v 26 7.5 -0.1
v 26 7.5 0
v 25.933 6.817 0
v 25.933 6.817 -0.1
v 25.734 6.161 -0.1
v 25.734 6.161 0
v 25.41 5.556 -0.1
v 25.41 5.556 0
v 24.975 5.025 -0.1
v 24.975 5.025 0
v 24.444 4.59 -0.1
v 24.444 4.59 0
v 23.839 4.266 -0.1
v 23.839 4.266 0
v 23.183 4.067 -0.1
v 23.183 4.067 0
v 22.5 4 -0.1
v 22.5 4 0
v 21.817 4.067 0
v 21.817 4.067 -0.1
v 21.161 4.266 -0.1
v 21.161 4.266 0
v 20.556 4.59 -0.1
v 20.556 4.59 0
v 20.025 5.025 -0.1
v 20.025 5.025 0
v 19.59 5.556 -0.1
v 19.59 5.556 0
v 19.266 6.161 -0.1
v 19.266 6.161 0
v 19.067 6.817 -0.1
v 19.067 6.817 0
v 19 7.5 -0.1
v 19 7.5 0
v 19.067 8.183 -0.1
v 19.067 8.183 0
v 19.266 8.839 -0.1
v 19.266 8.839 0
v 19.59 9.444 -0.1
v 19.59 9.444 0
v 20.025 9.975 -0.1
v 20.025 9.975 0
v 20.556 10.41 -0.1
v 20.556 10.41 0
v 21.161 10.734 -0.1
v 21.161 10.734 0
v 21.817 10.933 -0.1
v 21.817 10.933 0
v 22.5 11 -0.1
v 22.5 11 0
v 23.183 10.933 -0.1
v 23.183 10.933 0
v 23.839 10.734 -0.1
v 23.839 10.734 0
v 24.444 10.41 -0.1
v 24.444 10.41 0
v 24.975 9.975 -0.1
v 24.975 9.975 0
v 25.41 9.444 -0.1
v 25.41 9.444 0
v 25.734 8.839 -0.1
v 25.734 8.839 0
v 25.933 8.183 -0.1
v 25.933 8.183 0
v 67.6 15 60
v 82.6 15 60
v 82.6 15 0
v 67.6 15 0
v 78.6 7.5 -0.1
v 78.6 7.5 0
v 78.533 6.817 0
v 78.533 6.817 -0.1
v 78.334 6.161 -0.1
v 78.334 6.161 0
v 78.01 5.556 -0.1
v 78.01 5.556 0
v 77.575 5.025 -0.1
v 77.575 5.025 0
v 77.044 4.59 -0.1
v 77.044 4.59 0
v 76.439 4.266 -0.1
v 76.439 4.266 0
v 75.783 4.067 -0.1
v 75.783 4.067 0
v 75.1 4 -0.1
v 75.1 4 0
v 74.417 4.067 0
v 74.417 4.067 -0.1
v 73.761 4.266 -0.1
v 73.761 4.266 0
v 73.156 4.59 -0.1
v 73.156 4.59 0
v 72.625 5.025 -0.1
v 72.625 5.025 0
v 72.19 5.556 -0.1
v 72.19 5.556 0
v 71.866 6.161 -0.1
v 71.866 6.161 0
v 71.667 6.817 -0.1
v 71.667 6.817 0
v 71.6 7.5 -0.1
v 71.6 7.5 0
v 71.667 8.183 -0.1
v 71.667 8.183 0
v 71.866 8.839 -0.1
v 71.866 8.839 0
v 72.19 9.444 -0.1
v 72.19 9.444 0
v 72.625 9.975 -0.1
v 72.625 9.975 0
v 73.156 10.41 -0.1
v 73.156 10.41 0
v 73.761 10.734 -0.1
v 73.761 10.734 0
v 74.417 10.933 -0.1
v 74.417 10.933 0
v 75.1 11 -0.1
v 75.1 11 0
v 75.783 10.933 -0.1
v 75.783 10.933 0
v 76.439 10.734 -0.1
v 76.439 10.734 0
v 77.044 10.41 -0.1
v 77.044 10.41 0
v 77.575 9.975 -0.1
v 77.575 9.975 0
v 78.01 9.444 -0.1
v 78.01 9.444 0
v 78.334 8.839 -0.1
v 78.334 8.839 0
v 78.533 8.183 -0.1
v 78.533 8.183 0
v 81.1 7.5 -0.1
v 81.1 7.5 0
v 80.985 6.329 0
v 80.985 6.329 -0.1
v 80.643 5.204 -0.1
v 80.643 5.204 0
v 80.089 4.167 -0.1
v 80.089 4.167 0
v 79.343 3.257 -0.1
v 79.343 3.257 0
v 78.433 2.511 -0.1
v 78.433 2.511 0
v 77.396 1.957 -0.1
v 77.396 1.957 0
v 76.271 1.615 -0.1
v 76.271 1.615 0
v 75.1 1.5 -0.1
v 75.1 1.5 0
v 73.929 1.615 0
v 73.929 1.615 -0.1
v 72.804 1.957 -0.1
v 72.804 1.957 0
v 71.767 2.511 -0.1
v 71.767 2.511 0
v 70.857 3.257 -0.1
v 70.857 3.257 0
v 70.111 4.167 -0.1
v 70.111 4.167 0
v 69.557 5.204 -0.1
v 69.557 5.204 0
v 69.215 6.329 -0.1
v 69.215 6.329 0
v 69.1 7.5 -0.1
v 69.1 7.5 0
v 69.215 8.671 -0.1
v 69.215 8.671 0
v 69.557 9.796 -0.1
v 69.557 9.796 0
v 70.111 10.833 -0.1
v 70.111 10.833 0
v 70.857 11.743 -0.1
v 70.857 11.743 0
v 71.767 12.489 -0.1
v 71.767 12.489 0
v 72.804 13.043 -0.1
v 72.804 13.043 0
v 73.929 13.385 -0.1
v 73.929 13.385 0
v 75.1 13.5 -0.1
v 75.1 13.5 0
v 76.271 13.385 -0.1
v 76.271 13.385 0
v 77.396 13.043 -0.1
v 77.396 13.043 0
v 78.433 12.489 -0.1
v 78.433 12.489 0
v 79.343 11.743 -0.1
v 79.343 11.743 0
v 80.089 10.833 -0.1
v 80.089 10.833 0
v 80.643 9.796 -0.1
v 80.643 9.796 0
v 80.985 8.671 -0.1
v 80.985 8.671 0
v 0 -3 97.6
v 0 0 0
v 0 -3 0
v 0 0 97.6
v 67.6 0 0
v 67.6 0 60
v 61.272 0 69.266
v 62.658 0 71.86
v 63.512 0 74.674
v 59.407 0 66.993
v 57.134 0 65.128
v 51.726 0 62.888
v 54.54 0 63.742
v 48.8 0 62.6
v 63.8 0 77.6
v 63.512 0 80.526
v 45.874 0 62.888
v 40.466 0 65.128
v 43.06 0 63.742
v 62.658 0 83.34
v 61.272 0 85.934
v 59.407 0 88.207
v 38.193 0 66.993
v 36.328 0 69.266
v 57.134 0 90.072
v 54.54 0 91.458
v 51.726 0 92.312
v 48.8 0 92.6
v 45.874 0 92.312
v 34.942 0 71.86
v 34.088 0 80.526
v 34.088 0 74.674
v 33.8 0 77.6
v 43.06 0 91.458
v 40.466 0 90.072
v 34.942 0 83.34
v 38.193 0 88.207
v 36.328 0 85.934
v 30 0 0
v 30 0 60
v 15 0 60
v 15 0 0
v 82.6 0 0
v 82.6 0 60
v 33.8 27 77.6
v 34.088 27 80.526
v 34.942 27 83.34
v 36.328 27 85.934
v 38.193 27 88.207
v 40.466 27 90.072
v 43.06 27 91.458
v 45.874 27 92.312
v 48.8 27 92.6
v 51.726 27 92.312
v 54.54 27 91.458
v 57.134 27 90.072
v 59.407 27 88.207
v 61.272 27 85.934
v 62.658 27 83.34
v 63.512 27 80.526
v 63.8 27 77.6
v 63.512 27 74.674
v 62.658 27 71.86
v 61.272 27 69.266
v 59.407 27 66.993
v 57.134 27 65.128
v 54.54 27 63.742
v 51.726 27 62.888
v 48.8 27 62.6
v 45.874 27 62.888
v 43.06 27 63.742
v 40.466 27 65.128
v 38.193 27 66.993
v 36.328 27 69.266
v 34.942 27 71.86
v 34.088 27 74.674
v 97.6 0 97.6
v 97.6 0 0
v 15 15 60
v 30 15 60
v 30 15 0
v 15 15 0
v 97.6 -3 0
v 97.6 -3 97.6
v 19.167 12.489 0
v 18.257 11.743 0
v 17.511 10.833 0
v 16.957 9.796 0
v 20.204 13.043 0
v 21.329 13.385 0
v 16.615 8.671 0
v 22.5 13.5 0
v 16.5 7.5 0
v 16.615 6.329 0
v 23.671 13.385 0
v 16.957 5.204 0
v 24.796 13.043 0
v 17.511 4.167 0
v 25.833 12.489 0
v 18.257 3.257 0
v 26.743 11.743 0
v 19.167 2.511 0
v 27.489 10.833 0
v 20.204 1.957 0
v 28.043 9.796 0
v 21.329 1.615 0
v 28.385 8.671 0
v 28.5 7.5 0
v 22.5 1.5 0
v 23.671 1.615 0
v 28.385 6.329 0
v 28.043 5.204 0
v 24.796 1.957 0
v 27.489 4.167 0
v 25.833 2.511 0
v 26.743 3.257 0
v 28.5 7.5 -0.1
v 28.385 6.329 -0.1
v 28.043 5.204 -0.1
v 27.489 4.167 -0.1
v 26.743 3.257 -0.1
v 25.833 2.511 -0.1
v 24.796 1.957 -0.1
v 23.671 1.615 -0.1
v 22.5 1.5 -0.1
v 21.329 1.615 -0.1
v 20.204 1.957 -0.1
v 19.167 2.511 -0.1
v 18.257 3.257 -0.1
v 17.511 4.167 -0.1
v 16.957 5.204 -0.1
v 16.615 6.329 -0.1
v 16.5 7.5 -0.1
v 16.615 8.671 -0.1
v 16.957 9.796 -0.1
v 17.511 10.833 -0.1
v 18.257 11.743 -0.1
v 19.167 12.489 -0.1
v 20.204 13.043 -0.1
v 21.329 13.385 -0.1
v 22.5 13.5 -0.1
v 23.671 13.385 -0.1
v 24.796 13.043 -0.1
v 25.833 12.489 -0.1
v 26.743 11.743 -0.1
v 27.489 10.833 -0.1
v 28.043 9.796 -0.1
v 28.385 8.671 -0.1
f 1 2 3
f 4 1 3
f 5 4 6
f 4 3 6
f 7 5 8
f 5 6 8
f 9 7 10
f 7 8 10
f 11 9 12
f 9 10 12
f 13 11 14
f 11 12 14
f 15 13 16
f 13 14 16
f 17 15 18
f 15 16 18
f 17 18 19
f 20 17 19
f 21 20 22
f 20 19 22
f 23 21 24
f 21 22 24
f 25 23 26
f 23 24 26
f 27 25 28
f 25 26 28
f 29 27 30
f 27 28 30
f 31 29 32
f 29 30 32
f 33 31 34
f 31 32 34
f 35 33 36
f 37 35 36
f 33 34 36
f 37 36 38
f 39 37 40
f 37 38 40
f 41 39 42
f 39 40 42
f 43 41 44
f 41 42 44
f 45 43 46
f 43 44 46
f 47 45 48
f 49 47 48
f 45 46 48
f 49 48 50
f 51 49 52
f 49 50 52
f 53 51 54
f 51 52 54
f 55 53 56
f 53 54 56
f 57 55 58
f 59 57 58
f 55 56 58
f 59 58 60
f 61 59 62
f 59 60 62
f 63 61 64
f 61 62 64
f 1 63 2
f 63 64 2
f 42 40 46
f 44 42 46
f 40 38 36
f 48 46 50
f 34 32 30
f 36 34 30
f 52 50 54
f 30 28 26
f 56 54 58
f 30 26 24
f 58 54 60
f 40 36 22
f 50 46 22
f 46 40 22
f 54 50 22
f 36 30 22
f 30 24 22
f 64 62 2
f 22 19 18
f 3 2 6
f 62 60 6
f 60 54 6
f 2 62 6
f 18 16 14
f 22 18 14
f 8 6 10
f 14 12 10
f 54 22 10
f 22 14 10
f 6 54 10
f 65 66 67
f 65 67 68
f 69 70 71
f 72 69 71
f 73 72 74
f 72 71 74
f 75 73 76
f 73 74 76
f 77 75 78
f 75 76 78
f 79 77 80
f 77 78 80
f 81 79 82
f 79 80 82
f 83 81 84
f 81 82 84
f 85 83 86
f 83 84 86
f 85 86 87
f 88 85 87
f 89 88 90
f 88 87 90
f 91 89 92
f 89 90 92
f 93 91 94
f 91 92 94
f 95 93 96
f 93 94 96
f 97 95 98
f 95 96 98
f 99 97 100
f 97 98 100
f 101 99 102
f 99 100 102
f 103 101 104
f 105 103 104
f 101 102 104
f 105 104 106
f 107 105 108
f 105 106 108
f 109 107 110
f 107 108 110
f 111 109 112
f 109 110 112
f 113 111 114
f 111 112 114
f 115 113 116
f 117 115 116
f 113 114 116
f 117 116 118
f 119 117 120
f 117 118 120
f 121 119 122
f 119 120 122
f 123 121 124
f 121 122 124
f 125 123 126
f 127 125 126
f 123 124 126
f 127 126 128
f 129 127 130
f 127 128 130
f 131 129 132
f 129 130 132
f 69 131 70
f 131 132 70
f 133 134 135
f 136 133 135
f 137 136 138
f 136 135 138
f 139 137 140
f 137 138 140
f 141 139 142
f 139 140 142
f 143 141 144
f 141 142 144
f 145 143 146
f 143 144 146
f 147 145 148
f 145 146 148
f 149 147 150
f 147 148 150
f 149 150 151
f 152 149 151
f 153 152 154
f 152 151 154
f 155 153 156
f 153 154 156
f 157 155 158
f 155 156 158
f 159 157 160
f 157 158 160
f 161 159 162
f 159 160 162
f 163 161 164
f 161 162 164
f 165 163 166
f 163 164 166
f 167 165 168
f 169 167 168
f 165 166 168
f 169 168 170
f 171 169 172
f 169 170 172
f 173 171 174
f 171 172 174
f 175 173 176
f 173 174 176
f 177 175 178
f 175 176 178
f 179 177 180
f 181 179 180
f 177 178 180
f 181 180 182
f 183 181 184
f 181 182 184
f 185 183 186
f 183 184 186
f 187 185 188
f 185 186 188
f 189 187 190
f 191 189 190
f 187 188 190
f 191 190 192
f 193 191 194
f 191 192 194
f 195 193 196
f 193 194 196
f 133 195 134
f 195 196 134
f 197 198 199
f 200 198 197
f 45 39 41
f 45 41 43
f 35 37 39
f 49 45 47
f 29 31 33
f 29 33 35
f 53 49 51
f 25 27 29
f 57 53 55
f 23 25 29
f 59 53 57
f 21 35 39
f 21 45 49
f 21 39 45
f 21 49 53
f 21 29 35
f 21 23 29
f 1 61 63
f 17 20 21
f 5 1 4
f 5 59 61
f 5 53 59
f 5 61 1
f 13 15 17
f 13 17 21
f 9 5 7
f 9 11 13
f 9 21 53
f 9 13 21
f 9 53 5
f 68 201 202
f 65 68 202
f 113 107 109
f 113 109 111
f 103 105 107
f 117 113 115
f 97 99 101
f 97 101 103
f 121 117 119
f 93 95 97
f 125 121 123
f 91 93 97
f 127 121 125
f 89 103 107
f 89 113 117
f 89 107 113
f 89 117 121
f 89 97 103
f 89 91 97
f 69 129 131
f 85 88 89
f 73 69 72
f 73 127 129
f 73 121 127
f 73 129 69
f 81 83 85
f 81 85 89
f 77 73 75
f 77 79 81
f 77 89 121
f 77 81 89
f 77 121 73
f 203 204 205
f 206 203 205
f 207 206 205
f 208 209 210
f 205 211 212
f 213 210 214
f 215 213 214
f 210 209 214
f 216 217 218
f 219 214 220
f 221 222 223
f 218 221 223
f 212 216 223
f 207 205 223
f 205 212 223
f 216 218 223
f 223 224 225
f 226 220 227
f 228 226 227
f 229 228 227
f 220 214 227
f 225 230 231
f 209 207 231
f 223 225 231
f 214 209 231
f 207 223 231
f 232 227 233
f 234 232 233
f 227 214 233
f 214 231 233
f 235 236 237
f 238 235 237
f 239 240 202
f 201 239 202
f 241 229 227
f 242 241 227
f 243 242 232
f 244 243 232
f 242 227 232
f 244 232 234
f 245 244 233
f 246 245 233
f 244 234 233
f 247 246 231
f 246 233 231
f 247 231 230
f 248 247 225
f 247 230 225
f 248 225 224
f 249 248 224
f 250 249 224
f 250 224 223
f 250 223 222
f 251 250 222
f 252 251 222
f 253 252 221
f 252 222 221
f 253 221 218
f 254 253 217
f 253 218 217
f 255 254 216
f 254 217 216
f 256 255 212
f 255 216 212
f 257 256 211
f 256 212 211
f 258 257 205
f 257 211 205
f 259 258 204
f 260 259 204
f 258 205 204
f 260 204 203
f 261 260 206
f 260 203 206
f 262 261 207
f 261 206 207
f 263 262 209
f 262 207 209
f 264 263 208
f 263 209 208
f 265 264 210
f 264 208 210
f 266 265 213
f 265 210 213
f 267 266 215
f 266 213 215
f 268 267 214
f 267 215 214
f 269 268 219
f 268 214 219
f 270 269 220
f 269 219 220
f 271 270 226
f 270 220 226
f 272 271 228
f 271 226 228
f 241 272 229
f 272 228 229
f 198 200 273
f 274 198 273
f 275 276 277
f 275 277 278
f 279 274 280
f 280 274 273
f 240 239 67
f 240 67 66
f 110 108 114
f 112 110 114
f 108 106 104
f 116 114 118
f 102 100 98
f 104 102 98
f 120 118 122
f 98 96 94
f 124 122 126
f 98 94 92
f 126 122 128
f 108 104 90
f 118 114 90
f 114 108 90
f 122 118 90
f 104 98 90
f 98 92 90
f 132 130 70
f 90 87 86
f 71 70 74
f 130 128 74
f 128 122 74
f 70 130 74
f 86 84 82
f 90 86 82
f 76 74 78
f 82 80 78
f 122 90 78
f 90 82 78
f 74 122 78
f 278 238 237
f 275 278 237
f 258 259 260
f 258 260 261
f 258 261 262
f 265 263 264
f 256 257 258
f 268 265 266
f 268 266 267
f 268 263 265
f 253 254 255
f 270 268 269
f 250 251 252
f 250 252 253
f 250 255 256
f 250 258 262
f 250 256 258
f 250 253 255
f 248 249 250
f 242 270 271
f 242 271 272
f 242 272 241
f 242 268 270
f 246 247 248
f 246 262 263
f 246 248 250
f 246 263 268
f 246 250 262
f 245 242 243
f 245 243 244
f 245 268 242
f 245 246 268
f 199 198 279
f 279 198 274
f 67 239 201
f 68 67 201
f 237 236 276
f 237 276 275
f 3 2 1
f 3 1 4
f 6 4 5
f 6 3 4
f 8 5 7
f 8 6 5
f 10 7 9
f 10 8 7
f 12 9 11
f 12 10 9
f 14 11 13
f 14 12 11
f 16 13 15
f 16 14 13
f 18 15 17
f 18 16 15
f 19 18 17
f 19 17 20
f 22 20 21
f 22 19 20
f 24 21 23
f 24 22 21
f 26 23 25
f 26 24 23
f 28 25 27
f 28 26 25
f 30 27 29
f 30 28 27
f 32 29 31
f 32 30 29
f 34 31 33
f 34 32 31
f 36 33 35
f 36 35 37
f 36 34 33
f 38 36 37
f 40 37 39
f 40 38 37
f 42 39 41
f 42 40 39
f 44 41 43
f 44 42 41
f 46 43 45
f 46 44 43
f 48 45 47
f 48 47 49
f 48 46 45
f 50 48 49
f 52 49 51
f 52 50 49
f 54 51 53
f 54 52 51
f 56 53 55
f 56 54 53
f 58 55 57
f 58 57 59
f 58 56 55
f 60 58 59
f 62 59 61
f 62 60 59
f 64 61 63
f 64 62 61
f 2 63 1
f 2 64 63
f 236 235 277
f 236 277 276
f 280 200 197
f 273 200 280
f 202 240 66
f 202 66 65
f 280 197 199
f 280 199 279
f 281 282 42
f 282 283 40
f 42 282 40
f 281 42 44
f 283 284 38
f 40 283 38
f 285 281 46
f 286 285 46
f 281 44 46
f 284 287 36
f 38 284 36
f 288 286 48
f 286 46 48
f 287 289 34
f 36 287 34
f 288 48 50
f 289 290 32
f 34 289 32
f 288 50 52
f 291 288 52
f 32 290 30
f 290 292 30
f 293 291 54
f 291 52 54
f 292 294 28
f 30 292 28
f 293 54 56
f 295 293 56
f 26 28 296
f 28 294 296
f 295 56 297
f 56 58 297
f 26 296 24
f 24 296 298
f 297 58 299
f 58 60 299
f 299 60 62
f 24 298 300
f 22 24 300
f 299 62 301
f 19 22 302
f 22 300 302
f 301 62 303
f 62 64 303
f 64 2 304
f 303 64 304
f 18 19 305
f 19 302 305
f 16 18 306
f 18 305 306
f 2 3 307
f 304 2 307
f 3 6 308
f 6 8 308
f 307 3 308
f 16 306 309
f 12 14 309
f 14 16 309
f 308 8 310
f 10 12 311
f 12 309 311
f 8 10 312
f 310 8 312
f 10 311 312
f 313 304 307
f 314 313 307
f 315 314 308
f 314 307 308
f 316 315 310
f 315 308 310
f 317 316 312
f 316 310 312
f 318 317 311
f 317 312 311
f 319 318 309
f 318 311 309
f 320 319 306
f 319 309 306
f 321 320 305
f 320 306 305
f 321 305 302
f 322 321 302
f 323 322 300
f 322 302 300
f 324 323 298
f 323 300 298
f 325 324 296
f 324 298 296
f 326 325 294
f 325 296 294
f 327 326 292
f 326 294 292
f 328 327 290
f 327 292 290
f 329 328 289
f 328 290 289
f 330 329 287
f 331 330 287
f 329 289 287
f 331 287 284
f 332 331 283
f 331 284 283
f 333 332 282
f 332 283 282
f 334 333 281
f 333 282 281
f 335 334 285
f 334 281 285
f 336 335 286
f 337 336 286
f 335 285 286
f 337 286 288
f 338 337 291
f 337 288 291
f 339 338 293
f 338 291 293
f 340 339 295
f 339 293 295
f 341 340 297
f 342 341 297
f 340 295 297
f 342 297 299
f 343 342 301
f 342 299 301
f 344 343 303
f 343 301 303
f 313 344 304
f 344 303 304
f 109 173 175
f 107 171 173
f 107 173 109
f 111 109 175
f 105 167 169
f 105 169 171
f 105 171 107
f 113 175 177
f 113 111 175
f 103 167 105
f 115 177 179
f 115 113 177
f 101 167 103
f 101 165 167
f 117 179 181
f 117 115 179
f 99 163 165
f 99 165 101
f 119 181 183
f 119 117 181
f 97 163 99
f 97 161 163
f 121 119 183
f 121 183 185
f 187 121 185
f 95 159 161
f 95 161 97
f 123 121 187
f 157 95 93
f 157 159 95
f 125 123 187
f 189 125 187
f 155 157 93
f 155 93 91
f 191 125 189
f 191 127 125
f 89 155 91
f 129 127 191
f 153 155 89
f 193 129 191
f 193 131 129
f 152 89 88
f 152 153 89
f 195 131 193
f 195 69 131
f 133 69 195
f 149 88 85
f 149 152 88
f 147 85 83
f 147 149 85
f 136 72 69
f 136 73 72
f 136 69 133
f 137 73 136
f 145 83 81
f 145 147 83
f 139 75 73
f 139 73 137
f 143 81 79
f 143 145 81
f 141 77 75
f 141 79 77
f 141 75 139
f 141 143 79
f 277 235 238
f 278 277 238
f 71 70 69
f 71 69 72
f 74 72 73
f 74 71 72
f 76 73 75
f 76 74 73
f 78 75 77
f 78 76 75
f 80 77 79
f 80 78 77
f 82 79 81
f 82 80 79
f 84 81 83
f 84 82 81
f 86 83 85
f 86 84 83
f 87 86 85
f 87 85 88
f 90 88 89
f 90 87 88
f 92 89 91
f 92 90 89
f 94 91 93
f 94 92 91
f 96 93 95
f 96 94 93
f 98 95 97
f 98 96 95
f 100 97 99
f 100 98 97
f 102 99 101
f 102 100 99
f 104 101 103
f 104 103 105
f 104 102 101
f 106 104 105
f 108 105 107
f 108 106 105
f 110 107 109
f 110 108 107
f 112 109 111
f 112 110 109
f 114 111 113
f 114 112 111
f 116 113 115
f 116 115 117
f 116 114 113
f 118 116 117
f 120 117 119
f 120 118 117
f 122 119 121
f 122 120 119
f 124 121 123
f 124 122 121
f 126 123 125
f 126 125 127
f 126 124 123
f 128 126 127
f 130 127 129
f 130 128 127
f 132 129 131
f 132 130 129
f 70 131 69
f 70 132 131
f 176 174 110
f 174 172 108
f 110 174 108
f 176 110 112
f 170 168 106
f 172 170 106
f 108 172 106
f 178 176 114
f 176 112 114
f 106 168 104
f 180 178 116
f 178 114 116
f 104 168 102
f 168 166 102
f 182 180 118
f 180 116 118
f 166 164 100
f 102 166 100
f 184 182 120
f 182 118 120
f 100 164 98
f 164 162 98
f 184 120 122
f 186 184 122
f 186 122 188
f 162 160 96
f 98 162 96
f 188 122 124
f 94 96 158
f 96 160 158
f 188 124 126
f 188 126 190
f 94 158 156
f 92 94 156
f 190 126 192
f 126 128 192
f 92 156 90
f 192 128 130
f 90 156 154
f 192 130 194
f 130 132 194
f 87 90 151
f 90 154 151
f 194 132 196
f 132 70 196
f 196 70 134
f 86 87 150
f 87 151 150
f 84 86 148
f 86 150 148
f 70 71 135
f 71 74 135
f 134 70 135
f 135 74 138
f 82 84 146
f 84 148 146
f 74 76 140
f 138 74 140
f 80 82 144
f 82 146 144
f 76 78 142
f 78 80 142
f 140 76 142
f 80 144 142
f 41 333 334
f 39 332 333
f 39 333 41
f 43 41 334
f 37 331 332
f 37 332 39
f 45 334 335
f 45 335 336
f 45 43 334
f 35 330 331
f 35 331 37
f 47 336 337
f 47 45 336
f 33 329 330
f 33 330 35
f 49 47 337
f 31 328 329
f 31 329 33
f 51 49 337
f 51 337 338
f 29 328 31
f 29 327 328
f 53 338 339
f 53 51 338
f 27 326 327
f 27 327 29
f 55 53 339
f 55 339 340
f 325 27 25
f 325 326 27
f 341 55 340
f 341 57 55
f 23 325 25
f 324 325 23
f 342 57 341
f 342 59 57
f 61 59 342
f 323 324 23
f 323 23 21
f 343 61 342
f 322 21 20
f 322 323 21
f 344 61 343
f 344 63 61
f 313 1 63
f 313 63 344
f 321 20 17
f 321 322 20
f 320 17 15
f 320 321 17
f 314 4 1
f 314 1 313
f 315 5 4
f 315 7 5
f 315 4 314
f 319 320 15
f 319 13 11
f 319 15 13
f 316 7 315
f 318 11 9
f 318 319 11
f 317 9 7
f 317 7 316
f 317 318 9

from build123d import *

# Parameters (mm, degrees)
F0_W      = 97.6
F0_H      = 97.6
F1_DEPTH  = 3
F2_W      = 15
F2_H      = 60
F3_DEPTH  = 15
F4_R      = 6
F4_R_2    = 3.5
F5_DEPTH  = 0.1
F6_R      = 6
F6_R_2    = 3.5
F7_DEPTH  = 0.1
F8_R      = 3.5
F9_DEPTH  = 0.1
F10_R     = 3.5
F11_DEPTH = 0.1
F12_R     = 15
F13_DEPTH = 27


with BuildPart() as f1:
    # F0 (on Front) → F1 (new body)
    with BuildSketch(Plane.XZ):
        with Locations((48.8, 48.8)):
            Rectangle(F0_W, F0_H)
    extrude(amount=F1_DEPTH)


with BuildPart() as f3:
    # F2 (on face) → F3 (new body)
    with BuildSketch(Plane(origin=(0, 0, 0), x_dir=(-1, 0, 0), z_dir=(0, 1, 0))):
        with Locations((-22.5, 30)):
            Rectangle(F2_W, F2_H)
        with Locations((-75.1, 30)):
            Rectangle(F2_W, F2_H)
    extrude(amount=F3_DEPTH)


with BuildPart() as f5:
    # F4 (on face) → F5 (new body)
    with BuildSketch(Plane(origin=(0, 0, 0), x_dir=(1, 0, 0), z_dir=(0, 0, -1))):
        with Locations((22.5, -7.5)):
            Circle(F4_R)
        with Locations((22.5, -7.5)):
            Circle(F4_R_2, mode=Mode.SUBTRACT)
    extrude(amount=F5_DEPTH)


with BuildPart() as f7:
    # F6 (on face) → F7 (new body)
    with BuildSketch(Plane(origin=(0, 0, 0), x_dir=(1, 0, 0), z_dir=(0, 0, -1))):
        with Locations((75.1, -7.5)):
            Circle(F6_R)
        with Locations((75.1, -7.5)):
            Circle(F6_R_2, mode=Mode.SUBTRACT)
    extrude(amount=F7_DEPTH)


with BuildPart() as f9:
    # F8 (on face) → F9 (new body)
    with BuildSketch(Plane(origin=(0, 0, 0), x_dir=(1, 0, 0), z_dir=(0, 0, -1))):
        with Locations((75.1, -7.5)):
            Circle(F8_R)
    extrude(amount=F9_DEPTH)


with BuildPart() as f11:
    # F10 (on face) → F11 (new body)
    with BuildSketch(Plane(origin=(0, 0, 0), x_dir=(1, 0, 0), z_dir=(0, 0, -1))):
        with Locations((22.5, -7.5)):
            Circle(F10_R)
    extrude(amount=F11_DEPTH)


with BuildPart() as f13:
    # F12 (on face) → F13 (new body)
    with BuildSketch(Plane(origin=(0, 0, 0), x_dir=(-1, 0, 0), z_dir=(0, 1, 0))):
        with Locations((-48.8, 77.6)):
            Circle(F12_R)
    extrude(amount=F13_DEPTH)


solid = Compound([f1.part, f3.part, f5.part, f7.part, f9.part, f11.part, f13.part])
